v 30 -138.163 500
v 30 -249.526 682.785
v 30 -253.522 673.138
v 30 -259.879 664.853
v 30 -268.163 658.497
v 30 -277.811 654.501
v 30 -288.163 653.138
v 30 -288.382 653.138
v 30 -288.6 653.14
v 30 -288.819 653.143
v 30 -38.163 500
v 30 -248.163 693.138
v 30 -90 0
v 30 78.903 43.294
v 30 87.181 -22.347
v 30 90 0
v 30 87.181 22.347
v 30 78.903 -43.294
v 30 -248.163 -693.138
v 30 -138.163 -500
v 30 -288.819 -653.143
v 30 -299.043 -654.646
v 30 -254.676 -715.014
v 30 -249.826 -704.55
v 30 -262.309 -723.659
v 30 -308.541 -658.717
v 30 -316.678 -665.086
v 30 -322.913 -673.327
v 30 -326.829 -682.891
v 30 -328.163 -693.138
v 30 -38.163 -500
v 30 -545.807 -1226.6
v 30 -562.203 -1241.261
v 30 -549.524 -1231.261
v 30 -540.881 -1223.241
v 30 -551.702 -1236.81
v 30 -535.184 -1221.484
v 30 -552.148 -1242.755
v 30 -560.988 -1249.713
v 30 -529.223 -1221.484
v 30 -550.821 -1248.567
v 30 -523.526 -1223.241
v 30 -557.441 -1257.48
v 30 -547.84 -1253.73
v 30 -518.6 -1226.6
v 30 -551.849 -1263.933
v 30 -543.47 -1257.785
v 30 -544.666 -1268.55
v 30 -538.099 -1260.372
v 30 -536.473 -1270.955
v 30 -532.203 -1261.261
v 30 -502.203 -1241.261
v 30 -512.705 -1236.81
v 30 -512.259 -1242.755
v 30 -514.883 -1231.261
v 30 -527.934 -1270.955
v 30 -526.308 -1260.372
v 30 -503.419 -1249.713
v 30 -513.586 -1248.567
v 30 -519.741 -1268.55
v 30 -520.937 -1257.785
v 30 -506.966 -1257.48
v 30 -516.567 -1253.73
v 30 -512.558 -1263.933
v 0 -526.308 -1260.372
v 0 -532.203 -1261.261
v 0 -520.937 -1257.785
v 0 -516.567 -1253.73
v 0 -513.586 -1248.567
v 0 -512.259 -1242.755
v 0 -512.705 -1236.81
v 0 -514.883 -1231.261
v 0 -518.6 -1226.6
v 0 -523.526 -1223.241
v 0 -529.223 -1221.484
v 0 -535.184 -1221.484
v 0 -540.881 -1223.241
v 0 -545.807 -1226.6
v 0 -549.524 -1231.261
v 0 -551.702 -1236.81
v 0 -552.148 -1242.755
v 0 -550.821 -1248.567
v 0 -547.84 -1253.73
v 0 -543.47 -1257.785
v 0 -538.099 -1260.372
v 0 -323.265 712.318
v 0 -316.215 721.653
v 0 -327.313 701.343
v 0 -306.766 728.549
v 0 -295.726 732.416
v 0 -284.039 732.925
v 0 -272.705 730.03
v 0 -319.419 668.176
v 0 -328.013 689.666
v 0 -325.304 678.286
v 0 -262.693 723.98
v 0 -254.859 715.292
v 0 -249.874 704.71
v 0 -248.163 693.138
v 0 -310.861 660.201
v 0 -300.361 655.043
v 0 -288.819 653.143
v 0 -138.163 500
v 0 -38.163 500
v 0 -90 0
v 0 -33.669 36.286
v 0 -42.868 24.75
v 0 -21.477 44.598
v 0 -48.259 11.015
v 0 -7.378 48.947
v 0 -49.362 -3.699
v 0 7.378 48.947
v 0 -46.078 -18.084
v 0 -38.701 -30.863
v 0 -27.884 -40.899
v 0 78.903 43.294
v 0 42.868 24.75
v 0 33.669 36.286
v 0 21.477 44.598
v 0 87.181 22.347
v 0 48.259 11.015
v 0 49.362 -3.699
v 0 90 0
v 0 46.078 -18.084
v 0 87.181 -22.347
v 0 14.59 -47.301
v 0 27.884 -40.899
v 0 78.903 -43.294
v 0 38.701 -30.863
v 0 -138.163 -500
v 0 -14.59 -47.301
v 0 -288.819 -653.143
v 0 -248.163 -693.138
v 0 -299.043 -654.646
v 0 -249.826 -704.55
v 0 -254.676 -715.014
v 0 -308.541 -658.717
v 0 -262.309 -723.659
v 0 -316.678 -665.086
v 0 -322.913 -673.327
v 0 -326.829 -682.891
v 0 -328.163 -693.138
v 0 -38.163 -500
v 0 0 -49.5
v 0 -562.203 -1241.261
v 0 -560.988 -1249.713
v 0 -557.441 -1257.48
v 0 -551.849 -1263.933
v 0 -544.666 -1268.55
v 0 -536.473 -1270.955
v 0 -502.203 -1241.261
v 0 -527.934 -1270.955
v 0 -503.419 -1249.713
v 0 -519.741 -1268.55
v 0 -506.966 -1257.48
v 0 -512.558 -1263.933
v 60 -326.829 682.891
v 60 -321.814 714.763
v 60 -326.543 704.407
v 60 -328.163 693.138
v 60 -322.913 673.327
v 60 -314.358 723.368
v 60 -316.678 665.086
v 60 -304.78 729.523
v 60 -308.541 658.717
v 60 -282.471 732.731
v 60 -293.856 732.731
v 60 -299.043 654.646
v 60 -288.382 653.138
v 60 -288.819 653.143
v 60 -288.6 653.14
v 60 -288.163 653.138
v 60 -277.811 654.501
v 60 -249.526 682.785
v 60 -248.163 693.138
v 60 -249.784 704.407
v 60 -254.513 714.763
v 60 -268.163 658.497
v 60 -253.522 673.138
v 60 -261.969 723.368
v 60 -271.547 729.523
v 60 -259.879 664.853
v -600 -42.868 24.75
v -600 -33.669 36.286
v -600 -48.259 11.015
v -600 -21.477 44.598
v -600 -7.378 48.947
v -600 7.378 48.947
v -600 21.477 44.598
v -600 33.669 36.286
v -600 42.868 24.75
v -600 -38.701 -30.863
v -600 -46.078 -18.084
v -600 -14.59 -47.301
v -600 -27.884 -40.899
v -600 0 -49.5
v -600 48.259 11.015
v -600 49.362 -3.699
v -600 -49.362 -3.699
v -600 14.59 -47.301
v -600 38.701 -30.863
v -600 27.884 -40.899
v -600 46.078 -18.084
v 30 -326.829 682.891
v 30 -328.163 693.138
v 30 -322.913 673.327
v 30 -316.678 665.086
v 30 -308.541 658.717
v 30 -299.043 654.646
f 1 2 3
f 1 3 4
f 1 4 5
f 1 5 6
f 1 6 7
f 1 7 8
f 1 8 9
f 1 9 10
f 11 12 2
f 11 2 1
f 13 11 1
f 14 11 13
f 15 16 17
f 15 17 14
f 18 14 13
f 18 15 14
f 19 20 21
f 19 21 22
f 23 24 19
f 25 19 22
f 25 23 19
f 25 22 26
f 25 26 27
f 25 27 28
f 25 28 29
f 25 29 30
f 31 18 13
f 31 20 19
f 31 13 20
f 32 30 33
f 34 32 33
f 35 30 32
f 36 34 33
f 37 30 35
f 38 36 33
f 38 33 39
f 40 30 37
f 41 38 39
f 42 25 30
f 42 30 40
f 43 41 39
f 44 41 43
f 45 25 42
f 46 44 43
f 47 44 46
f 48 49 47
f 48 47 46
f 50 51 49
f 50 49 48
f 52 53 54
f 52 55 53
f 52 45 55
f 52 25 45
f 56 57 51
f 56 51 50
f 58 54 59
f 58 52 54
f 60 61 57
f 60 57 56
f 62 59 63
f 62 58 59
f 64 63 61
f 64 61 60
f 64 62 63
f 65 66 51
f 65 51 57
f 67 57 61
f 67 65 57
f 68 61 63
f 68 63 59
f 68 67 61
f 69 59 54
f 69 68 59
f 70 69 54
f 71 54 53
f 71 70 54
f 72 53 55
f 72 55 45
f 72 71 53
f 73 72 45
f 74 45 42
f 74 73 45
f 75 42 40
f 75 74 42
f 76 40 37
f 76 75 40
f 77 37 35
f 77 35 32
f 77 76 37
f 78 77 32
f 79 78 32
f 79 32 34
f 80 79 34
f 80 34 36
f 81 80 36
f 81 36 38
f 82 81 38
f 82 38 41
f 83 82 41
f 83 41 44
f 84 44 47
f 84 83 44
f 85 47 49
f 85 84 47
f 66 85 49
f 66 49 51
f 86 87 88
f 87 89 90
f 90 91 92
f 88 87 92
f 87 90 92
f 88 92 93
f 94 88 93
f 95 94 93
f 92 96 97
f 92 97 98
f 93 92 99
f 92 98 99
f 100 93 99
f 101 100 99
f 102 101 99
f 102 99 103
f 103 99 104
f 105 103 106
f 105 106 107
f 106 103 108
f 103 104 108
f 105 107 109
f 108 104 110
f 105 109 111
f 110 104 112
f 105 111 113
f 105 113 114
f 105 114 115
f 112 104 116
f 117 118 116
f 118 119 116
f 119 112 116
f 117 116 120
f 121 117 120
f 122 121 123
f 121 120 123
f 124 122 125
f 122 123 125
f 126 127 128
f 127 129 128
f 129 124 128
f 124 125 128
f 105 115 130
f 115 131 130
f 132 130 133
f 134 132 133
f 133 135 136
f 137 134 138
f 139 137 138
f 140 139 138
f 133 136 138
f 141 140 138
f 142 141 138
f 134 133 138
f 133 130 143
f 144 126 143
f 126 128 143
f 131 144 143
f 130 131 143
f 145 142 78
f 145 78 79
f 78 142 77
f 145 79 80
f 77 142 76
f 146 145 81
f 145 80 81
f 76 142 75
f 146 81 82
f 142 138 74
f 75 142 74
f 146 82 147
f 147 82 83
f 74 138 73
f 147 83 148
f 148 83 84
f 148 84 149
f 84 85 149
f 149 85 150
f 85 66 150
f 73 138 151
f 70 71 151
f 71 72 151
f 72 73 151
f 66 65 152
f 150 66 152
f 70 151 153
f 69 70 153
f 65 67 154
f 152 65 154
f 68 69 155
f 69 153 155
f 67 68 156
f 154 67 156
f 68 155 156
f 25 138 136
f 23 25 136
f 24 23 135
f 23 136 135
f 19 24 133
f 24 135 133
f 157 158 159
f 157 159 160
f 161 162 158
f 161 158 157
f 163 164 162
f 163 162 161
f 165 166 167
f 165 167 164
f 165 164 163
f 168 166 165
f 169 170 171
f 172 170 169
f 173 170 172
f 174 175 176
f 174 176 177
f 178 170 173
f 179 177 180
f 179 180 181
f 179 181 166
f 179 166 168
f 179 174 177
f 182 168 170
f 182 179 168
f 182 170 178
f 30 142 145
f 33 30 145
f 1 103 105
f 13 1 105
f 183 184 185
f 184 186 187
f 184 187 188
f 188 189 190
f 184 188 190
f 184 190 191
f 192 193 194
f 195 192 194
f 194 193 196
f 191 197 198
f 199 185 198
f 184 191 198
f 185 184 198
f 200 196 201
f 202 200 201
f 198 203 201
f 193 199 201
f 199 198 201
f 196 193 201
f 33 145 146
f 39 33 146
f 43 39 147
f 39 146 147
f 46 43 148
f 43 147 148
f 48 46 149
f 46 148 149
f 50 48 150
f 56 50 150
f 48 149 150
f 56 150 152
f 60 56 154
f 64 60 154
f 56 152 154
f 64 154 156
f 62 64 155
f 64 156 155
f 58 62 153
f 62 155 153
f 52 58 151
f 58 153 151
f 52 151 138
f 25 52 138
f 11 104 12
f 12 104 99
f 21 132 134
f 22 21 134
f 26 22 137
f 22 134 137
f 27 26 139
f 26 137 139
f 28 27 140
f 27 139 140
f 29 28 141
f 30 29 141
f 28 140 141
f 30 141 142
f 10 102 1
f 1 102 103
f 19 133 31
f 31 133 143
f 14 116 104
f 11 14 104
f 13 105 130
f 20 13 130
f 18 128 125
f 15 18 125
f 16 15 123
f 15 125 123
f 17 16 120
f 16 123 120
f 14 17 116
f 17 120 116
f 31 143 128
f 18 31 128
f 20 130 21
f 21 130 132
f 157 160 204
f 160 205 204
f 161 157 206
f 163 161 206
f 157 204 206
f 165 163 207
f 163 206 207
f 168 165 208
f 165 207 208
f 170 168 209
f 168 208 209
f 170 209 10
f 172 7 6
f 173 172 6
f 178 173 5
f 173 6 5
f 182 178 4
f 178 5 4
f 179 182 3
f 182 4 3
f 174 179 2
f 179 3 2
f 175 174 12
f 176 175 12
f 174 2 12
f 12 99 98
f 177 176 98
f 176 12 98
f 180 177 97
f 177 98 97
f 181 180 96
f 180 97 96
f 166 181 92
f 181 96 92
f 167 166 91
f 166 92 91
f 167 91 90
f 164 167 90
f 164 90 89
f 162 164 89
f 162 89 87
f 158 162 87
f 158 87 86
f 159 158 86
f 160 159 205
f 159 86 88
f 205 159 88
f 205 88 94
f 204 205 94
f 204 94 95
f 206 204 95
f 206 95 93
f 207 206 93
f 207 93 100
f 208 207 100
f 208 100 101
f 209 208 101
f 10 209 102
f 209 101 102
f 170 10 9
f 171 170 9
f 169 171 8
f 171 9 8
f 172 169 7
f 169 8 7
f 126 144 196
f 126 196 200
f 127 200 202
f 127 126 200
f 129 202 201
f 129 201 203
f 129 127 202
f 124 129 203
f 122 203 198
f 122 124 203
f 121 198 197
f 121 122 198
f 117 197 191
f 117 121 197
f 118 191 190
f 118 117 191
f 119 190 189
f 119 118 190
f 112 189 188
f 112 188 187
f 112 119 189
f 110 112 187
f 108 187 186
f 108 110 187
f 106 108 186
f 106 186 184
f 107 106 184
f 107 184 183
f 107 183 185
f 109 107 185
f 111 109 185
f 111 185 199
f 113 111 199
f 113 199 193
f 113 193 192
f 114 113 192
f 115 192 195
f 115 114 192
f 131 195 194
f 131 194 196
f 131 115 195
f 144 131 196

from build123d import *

# Parameters (mm, degrees)
SKETCH1_R           = 20
BOSS_EXTRUDE1_DEPTH = 30
SKETCH1_3_R         = 40
BOSS_EXTRUDE2_DEPTH = 60
SKETCH1_4_R         = 49.5
BOSS_EXTRUDE3_DEPTH = 600


with BuildPart() as part:
    # Sketch1 → Boss-Extrude1 (new body)
    with BuildSketch(Plane(origin=(0, 0, 0), x_dir=(0, 0, -1), z_dir=(1, 0, 0))):
        with BuildLine():
            Line((-500, -38.163490354), (-693.137754961, -248.163490354))
            ThreePointArc((-693.137754961, -248.163490354), (-721.652707583, -316.215183298), (-653.1431202, -288.818616504))
            Line((-653.1431202, -288.818616504), (-500, -138.163490354))
            Line((-500, -138.163490354), (0, -90))
            Line((0, -90), (500, -138.163490354))
            Line((500, -138.163490354), (653.1431202, -288.818616504))
            ThreePointArc((653.1431202, -288.818616504), (665.086062018, -316.678442975), (693.137754961, -328.163490354))
            Line((693.137754961, -328.163490354), (1241.260569265, -562.203490354))
            ThreePointArc((1241.260569265, -562.203490354), (1271.260569265, -532.203490354), (1241.260569265, -502.203490354))
            Line((1241.260569265, -502.203490354), (723.659328701, -262.309408733))
            ThreePointArc((723.659328701, -262.309408733), (709.957932356, -251.87187104), (693.137754961, -248.163490354))
            Line((693.137754961, -248.163490354), (500, -38.163490354))
            Line((500, -38.163490354), (43.294270514, 78.902510357))
            ThreePointArc((43.294270514, 78.902510357), (0, 90), (-43.294270514, 78.902510357))
            Line((-43.294270514, 78.902510357), (-500, -38.163490354))
        make_face()
        with Locations((1241.260569265, -532.203490354)):
            Circle(SKETCH1_R, mode=Mode.SUBTRACT)
    extrude(amount=BOSS_EXTRUDE1_DEPTH)

    # Sketch1<3> → Boss-Extrude2 (add)
    with BuildSketch(Plane(origin=(0, 0, 0), x_dir=(0, 0, -1), z_dir=(1, 0, 0))):
        with Locations((-693.137754961, -288.163490354)):
            Circle(SKETCH1_3_R)
    extrude(amount=BOSS_EXTRUDE2_DEPTH)

    # Sketch1<4> → Boss-Extrude3 (add)
    with BuildSketch(Plane(origin=(0, 0, 0), x_dir=(0, 0, -1), z_dir=(1, 0, 0))):
        Circle(SKETCH1_4_R)
    extrude(amount=-BOSS_EXTRUDE3_DEPTH)


solid = part.part
